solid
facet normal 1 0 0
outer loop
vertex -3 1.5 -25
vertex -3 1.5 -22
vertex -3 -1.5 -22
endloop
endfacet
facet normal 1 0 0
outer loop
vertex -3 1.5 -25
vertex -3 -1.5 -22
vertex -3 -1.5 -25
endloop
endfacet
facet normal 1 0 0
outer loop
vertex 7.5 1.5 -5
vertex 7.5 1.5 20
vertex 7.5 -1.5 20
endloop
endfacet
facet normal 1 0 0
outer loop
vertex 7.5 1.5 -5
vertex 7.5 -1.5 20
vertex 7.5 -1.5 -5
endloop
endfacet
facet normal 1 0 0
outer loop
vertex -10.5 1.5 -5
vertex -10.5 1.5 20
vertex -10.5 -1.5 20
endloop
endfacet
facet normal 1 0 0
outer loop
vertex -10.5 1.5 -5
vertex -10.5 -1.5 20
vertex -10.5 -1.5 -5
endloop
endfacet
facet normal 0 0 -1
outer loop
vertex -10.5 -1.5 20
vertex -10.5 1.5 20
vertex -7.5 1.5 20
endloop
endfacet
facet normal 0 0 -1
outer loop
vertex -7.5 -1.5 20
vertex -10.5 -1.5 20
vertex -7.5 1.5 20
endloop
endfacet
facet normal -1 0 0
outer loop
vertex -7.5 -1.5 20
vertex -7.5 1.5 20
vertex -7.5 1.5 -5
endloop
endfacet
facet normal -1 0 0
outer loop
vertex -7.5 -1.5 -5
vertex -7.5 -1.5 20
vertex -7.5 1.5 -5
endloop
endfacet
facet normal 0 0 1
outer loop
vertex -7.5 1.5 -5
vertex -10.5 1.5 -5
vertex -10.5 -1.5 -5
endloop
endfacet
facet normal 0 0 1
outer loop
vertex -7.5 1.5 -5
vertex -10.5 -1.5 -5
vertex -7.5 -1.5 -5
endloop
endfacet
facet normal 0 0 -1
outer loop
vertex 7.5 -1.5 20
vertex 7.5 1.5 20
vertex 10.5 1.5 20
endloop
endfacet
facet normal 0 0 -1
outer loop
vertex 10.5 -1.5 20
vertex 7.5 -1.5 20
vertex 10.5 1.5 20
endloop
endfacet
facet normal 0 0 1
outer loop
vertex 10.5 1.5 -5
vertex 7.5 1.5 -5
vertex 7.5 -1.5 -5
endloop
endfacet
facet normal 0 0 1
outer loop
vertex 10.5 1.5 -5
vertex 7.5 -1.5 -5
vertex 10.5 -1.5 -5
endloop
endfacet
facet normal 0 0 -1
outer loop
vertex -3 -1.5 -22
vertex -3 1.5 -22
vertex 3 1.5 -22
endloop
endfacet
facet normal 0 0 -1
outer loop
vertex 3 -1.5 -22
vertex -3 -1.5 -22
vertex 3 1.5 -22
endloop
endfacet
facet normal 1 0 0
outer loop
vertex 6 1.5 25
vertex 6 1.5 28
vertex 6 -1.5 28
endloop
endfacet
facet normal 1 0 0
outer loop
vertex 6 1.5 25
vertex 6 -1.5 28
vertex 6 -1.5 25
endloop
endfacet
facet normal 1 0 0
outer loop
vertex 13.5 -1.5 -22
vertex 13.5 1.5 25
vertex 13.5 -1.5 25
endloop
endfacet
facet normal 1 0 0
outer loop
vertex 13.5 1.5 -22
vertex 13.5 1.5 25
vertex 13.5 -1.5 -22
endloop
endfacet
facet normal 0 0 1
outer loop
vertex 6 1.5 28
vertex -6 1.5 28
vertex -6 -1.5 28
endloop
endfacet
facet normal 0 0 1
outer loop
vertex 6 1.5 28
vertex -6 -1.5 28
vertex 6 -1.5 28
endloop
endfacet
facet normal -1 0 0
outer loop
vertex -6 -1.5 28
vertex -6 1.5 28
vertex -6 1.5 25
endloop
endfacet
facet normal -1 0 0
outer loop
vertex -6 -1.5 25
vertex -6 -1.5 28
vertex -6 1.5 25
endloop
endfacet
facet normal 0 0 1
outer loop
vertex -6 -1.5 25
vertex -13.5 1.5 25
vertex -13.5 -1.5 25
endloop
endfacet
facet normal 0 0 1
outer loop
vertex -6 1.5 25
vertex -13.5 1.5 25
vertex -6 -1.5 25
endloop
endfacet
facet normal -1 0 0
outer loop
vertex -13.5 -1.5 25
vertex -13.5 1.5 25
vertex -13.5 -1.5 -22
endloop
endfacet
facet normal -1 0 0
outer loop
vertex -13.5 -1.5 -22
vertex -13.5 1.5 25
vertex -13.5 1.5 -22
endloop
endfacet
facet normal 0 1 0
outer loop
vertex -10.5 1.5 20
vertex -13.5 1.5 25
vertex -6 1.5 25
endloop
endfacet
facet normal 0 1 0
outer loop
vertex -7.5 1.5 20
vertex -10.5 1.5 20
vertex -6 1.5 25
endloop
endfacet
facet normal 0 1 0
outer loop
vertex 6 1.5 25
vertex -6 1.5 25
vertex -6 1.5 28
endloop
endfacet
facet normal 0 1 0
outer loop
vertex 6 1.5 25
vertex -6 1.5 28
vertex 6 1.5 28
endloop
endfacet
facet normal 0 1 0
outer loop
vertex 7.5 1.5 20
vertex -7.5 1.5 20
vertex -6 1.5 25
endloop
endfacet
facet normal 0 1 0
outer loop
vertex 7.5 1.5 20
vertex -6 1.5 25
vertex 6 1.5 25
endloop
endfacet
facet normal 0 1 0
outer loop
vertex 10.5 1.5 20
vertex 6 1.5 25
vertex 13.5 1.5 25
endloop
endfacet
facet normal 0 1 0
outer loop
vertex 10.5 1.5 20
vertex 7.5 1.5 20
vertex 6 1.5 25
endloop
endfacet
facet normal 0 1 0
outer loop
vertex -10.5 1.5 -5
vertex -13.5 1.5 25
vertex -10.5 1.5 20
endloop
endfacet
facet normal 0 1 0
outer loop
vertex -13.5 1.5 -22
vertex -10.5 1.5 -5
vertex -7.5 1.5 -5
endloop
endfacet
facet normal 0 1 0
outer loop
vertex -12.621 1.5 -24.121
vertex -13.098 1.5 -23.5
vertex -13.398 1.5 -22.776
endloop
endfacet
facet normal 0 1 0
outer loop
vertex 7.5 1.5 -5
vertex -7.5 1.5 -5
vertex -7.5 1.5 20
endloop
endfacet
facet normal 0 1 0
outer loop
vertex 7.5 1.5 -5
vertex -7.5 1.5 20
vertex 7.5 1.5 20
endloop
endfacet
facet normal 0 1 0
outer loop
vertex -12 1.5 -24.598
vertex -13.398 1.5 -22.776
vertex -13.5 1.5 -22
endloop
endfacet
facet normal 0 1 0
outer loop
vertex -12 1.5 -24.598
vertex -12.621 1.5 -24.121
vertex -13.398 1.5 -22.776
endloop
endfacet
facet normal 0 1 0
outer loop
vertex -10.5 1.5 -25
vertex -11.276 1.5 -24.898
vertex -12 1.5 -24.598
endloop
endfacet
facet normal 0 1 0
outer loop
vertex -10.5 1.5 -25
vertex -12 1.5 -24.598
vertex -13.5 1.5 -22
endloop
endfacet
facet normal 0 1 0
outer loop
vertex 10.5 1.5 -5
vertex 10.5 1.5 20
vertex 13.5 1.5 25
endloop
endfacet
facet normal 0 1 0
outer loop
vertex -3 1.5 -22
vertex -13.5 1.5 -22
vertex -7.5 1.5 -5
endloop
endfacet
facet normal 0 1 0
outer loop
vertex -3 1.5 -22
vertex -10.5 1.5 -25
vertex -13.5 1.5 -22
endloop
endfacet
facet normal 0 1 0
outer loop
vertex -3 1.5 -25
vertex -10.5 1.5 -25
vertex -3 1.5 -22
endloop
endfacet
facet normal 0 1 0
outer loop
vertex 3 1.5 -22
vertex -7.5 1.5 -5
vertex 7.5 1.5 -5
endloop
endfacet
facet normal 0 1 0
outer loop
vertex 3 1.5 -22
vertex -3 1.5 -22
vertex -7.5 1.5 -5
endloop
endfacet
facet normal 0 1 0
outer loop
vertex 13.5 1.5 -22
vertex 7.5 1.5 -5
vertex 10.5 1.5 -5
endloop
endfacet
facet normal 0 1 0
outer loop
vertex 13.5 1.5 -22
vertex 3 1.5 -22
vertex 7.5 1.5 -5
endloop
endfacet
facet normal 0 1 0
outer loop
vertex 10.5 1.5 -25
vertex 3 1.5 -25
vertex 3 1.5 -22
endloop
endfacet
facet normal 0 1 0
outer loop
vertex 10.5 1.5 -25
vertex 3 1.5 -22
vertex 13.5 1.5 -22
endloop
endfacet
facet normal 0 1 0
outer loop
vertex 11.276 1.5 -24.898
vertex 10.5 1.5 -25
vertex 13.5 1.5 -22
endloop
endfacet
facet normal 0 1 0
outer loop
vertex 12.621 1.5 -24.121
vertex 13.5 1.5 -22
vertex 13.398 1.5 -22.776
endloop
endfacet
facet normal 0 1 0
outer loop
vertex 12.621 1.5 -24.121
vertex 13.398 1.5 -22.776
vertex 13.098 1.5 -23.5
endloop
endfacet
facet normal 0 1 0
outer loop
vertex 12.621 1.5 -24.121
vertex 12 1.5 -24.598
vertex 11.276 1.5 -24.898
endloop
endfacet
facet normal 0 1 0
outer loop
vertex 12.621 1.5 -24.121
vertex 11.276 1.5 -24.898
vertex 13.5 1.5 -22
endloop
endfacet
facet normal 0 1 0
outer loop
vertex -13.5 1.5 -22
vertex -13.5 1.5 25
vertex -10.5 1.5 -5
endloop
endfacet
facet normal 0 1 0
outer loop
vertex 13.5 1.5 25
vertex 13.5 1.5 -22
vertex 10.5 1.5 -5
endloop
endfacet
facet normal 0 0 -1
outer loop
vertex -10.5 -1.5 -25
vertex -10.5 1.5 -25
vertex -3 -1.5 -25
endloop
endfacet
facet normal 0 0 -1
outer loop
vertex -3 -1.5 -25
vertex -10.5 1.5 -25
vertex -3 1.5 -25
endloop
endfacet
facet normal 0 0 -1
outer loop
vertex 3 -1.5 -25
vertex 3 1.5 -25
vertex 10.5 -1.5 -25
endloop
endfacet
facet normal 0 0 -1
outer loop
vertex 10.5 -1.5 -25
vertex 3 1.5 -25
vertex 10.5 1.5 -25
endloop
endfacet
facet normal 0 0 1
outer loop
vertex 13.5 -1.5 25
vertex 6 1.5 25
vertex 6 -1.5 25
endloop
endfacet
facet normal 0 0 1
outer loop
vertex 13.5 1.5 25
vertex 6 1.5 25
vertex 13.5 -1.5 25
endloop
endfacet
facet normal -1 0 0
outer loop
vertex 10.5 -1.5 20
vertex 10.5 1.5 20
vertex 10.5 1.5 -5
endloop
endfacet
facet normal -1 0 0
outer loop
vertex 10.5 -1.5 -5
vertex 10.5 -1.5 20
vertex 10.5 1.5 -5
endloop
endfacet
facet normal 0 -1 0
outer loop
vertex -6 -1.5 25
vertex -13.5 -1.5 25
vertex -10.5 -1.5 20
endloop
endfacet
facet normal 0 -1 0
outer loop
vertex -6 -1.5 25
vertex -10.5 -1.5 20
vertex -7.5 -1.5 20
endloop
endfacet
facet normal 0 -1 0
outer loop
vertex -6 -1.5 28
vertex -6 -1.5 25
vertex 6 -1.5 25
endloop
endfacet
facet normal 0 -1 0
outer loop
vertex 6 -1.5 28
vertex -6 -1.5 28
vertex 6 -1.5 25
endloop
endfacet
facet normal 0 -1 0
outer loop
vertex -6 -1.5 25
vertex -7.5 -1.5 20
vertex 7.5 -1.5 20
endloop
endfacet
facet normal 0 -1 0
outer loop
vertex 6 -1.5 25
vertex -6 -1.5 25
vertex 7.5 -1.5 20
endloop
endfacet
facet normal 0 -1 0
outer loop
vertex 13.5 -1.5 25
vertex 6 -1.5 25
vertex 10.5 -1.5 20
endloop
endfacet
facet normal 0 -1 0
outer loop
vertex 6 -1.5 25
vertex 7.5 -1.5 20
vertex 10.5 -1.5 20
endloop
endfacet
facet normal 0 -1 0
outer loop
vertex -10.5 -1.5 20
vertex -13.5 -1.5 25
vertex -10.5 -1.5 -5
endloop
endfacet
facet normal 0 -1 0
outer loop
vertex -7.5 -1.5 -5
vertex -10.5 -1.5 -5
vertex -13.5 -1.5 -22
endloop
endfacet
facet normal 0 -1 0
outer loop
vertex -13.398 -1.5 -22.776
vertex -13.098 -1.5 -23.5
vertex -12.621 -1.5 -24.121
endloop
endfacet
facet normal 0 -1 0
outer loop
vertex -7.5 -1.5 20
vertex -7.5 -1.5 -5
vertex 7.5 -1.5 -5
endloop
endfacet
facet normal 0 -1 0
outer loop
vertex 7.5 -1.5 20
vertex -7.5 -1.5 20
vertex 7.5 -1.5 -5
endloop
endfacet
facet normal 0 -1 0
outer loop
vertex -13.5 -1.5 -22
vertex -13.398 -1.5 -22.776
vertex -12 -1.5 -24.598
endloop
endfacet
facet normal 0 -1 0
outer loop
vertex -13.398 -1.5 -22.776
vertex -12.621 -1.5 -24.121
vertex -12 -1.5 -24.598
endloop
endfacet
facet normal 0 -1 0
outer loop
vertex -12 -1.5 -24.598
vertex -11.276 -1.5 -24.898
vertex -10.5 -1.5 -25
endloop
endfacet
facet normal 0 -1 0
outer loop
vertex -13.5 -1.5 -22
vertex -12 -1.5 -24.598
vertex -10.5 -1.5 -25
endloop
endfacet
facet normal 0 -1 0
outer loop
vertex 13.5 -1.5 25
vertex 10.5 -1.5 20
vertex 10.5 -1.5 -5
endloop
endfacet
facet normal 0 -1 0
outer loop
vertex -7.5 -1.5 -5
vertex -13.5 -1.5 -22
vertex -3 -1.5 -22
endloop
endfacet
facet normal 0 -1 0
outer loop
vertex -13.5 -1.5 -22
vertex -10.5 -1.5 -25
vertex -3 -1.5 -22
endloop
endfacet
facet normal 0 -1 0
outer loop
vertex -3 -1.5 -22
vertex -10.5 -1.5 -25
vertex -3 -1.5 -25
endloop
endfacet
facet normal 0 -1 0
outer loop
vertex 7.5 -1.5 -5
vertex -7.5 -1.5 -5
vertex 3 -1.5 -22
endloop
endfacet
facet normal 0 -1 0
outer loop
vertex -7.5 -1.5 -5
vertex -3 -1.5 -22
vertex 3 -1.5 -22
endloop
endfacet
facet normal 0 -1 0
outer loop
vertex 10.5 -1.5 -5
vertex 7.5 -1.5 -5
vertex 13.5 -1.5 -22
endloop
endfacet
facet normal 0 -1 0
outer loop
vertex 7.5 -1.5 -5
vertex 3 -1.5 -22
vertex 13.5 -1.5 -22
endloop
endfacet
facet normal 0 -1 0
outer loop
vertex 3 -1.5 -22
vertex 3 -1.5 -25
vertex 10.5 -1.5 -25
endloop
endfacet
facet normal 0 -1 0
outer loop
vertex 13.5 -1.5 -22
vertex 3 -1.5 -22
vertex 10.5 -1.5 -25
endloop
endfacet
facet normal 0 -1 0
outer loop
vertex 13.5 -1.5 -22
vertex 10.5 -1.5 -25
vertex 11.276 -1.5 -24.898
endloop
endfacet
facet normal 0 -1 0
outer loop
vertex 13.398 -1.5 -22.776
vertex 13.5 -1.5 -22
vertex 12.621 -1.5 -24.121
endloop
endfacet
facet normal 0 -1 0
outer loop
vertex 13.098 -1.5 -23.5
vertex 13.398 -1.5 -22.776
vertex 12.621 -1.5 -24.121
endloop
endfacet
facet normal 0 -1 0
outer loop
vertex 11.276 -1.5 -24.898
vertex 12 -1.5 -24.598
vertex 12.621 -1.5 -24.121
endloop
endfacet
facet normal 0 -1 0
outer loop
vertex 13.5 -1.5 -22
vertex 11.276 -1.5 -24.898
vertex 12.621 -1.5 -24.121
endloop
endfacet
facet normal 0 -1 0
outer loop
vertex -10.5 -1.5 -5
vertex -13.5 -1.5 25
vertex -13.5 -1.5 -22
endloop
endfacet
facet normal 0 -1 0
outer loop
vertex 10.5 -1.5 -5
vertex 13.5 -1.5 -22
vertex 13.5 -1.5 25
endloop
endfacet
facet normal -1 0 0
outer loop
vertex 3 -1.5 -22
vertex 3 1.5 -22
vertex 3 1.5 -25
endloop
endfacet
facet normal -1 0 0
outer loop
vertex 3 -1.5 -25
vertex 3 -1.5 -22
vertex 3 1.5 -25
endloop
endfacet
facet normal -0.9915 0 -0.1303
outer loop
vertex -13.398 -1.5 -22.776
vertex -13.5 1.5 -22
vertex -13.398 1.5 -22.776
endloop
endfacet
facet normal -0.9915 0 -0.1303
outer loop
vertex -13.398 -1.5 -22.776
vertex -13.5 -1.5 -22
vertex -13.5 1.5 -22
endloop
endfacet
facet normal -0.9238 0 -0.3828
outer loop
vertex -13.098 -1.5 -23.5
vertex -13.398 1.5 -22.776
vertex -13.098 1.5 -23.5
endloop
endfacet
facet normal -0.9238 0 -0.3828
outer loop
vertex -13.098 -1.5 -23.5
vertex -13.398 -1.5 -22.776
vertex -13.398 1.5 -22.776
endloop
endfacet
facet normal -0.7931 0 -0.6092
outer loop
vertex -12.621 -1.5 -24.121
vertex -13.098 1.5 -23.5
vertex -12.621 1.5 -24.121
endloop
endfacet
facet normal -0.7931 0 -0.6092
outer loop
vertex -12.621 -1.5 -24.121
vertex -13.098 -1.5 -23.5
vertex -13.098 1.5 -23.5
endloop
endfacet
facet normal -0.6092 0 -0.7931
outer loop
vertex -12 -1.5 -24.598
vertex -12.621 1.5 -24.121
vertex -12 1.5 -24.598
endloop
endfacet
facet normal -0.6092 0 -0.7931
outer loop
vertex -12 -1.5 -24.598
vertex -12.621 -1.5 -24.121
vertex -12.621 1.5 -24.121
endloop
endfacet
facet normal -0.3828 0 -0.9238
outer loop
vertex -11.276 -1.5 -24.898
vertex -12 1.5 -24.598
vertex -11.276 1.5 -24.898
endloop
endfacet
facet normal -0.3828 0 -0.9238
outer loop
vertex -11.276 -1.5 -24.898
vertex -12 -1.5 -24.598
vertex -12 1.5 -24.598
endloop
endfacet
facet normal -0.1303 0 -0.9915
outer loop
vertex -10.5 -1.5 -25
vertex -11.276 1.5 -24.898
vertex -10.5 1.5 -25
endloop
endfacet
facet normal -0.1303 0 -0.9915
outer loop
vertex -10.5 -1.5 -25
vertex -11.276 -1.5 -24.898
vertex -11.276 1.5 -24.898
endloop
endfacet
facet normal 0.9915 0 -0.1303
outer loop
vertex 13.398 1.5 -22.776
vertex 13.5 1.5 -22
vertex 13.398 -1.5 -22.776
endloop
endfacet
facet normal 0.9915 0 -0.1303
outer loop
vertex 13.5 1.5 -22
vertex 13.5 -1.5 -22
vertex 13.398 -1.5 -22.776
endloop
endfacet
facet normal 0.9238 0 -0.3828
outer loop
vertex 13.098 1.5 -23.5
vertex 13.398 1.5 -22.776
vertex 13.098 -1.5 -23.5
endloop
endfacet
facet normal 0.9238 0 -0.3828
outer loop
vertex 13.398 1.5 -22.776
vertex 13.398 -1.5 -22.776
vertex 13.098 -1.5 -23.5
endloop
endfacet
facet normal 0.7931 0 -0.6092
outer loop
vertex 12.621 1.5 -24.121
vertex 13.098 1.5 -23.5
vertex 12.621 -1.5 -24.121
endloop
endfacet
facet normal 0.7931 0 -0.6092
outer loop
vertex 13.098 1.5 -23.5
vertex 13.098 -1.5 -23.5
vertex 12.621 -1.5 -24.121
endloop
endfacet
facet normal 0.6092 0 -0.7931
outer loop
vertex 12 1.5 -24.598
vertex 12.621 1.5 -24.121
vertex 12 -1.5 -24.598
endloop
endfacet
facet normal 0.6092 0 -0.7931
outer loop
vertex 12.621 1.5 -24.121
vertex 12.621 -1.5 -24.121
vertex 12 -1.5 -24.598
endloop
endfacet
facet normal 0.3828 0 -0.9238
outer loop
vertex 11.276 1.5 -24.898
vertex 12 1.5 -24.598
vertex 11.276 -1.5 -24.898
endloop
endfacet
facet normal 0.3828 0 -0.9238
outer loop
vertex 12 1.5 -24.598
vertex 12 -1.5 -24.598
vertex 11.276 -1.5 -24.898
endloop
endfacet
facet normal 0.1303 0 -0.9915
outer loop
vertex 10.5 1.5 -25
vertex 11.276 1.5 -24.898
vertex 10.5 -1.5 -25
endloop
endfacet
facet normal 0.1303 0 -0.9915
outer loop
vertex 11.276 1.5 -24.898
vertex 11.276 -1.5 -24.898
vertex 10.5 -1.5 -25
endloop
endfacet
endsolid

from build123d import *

# Parameters (mm, degrees)
SKETCH1_W               = 27
SKETCH1_H               = 50
BOSS_EXTRUDE1_DEPTH     = 1.5
SKETCH2_W               = 12
SKETCH2_H               = 3
BOSS_EXTRUDE2_DEPTH     = 1.5
SKETCH4_W               = 3
SKETCH4_H               = 25
CUT_EXTRUDE1_DEPTH      = 2.5
CUT_EXTRUDE1_DEPTH_BACK = 2.5
FILLET1_R               = 3
SKETCH5_W               = 6
SKETCH5_H               = 3
CUT_EXTRUDE2_DEPTH      = 2.5
CUT_EXTRUDE2_DEPTH_BACK = 2.5


with BuildPart() as part:
    # Sketch1 → Boss-Extrude1 (new body, symmetric)
    with BuildSketch(Plane(origin=(0, 0, 0), x_dir=(1, 0, 0), z_dir=(0, 1, 0))):
        Rectangle(SKETCH1_W, SKETCH1_H)
    extrude(amount=BOSS_EXTRUDE1_DEPTH, both=True)

    # Sketch2 → Boss-Extrude2 (add, symmetric)
    with BuildSketch(Plane(origin=(0, 0, 0), x_dir=(1, 0, 0), z_dir=(0, 1, 0))):
        with Locations((0, -26.5)):
            Rectangle(SKETCH2_W, SKETCH2_H)
    extrude(amount=BOSS_EXTRUDE2_DEPTH, both=True)

    # Sketch4 → Cut-Extrude1 (cut, two sides)
    with BuildSketch(Plane(origin=(0, 0, 0), x_dir=(1, 0, 0), z_dir=(0, 1, 0))) as cut_extrude1_sk:
        with Locations((-9, -7.5)):
            Rectangle(SKETCH4_W, SKETCH4_H)
        with Locations((9, -7.5)):
            Rectangle(SKETCH4_W, SKETCH4_H)
    extrude(amount=CUT_EXTRUDE1_DEPTH, mode=Mode.SUBTRACT)
    extrude(cut_extrude1_sk.sketch, amount=-CUT_EXTRUDE1_DEPTH_BACK, mode=Mode.SUBTRACT)

    # Fillet1
    fillet1_edges = [part.edges().sort_by_distance(p)[0] for p in [
        (-13.5, 0, -25),
        (13.5, 0, -25),
    ]]
    fillet(fillet1_edges, radius=FILLET1_R)

    # Sketch5 → Cut-Extrude2 (cut, two sides)
    with BuildSketch(Plane(origin=(0, 0, 0), x_dir=(1, 0, 0), z_dir=(0, 1, 0))) as cut_extrude2_sk:
        with Locations((0, 23.5)):
            Rectangle(SKETCH5_W, SKETCH5_H)
    extrude(amount=CUT_EXTRUDE2_DEPTH, mode=Mode.SUBTRACT)
    extrude(cut_extrude2_sk.sketch, amount=-CUT_EXTRUDE2_DEPTH_BACK, mode=Mode.SUBTRACT)


solid = part.part
